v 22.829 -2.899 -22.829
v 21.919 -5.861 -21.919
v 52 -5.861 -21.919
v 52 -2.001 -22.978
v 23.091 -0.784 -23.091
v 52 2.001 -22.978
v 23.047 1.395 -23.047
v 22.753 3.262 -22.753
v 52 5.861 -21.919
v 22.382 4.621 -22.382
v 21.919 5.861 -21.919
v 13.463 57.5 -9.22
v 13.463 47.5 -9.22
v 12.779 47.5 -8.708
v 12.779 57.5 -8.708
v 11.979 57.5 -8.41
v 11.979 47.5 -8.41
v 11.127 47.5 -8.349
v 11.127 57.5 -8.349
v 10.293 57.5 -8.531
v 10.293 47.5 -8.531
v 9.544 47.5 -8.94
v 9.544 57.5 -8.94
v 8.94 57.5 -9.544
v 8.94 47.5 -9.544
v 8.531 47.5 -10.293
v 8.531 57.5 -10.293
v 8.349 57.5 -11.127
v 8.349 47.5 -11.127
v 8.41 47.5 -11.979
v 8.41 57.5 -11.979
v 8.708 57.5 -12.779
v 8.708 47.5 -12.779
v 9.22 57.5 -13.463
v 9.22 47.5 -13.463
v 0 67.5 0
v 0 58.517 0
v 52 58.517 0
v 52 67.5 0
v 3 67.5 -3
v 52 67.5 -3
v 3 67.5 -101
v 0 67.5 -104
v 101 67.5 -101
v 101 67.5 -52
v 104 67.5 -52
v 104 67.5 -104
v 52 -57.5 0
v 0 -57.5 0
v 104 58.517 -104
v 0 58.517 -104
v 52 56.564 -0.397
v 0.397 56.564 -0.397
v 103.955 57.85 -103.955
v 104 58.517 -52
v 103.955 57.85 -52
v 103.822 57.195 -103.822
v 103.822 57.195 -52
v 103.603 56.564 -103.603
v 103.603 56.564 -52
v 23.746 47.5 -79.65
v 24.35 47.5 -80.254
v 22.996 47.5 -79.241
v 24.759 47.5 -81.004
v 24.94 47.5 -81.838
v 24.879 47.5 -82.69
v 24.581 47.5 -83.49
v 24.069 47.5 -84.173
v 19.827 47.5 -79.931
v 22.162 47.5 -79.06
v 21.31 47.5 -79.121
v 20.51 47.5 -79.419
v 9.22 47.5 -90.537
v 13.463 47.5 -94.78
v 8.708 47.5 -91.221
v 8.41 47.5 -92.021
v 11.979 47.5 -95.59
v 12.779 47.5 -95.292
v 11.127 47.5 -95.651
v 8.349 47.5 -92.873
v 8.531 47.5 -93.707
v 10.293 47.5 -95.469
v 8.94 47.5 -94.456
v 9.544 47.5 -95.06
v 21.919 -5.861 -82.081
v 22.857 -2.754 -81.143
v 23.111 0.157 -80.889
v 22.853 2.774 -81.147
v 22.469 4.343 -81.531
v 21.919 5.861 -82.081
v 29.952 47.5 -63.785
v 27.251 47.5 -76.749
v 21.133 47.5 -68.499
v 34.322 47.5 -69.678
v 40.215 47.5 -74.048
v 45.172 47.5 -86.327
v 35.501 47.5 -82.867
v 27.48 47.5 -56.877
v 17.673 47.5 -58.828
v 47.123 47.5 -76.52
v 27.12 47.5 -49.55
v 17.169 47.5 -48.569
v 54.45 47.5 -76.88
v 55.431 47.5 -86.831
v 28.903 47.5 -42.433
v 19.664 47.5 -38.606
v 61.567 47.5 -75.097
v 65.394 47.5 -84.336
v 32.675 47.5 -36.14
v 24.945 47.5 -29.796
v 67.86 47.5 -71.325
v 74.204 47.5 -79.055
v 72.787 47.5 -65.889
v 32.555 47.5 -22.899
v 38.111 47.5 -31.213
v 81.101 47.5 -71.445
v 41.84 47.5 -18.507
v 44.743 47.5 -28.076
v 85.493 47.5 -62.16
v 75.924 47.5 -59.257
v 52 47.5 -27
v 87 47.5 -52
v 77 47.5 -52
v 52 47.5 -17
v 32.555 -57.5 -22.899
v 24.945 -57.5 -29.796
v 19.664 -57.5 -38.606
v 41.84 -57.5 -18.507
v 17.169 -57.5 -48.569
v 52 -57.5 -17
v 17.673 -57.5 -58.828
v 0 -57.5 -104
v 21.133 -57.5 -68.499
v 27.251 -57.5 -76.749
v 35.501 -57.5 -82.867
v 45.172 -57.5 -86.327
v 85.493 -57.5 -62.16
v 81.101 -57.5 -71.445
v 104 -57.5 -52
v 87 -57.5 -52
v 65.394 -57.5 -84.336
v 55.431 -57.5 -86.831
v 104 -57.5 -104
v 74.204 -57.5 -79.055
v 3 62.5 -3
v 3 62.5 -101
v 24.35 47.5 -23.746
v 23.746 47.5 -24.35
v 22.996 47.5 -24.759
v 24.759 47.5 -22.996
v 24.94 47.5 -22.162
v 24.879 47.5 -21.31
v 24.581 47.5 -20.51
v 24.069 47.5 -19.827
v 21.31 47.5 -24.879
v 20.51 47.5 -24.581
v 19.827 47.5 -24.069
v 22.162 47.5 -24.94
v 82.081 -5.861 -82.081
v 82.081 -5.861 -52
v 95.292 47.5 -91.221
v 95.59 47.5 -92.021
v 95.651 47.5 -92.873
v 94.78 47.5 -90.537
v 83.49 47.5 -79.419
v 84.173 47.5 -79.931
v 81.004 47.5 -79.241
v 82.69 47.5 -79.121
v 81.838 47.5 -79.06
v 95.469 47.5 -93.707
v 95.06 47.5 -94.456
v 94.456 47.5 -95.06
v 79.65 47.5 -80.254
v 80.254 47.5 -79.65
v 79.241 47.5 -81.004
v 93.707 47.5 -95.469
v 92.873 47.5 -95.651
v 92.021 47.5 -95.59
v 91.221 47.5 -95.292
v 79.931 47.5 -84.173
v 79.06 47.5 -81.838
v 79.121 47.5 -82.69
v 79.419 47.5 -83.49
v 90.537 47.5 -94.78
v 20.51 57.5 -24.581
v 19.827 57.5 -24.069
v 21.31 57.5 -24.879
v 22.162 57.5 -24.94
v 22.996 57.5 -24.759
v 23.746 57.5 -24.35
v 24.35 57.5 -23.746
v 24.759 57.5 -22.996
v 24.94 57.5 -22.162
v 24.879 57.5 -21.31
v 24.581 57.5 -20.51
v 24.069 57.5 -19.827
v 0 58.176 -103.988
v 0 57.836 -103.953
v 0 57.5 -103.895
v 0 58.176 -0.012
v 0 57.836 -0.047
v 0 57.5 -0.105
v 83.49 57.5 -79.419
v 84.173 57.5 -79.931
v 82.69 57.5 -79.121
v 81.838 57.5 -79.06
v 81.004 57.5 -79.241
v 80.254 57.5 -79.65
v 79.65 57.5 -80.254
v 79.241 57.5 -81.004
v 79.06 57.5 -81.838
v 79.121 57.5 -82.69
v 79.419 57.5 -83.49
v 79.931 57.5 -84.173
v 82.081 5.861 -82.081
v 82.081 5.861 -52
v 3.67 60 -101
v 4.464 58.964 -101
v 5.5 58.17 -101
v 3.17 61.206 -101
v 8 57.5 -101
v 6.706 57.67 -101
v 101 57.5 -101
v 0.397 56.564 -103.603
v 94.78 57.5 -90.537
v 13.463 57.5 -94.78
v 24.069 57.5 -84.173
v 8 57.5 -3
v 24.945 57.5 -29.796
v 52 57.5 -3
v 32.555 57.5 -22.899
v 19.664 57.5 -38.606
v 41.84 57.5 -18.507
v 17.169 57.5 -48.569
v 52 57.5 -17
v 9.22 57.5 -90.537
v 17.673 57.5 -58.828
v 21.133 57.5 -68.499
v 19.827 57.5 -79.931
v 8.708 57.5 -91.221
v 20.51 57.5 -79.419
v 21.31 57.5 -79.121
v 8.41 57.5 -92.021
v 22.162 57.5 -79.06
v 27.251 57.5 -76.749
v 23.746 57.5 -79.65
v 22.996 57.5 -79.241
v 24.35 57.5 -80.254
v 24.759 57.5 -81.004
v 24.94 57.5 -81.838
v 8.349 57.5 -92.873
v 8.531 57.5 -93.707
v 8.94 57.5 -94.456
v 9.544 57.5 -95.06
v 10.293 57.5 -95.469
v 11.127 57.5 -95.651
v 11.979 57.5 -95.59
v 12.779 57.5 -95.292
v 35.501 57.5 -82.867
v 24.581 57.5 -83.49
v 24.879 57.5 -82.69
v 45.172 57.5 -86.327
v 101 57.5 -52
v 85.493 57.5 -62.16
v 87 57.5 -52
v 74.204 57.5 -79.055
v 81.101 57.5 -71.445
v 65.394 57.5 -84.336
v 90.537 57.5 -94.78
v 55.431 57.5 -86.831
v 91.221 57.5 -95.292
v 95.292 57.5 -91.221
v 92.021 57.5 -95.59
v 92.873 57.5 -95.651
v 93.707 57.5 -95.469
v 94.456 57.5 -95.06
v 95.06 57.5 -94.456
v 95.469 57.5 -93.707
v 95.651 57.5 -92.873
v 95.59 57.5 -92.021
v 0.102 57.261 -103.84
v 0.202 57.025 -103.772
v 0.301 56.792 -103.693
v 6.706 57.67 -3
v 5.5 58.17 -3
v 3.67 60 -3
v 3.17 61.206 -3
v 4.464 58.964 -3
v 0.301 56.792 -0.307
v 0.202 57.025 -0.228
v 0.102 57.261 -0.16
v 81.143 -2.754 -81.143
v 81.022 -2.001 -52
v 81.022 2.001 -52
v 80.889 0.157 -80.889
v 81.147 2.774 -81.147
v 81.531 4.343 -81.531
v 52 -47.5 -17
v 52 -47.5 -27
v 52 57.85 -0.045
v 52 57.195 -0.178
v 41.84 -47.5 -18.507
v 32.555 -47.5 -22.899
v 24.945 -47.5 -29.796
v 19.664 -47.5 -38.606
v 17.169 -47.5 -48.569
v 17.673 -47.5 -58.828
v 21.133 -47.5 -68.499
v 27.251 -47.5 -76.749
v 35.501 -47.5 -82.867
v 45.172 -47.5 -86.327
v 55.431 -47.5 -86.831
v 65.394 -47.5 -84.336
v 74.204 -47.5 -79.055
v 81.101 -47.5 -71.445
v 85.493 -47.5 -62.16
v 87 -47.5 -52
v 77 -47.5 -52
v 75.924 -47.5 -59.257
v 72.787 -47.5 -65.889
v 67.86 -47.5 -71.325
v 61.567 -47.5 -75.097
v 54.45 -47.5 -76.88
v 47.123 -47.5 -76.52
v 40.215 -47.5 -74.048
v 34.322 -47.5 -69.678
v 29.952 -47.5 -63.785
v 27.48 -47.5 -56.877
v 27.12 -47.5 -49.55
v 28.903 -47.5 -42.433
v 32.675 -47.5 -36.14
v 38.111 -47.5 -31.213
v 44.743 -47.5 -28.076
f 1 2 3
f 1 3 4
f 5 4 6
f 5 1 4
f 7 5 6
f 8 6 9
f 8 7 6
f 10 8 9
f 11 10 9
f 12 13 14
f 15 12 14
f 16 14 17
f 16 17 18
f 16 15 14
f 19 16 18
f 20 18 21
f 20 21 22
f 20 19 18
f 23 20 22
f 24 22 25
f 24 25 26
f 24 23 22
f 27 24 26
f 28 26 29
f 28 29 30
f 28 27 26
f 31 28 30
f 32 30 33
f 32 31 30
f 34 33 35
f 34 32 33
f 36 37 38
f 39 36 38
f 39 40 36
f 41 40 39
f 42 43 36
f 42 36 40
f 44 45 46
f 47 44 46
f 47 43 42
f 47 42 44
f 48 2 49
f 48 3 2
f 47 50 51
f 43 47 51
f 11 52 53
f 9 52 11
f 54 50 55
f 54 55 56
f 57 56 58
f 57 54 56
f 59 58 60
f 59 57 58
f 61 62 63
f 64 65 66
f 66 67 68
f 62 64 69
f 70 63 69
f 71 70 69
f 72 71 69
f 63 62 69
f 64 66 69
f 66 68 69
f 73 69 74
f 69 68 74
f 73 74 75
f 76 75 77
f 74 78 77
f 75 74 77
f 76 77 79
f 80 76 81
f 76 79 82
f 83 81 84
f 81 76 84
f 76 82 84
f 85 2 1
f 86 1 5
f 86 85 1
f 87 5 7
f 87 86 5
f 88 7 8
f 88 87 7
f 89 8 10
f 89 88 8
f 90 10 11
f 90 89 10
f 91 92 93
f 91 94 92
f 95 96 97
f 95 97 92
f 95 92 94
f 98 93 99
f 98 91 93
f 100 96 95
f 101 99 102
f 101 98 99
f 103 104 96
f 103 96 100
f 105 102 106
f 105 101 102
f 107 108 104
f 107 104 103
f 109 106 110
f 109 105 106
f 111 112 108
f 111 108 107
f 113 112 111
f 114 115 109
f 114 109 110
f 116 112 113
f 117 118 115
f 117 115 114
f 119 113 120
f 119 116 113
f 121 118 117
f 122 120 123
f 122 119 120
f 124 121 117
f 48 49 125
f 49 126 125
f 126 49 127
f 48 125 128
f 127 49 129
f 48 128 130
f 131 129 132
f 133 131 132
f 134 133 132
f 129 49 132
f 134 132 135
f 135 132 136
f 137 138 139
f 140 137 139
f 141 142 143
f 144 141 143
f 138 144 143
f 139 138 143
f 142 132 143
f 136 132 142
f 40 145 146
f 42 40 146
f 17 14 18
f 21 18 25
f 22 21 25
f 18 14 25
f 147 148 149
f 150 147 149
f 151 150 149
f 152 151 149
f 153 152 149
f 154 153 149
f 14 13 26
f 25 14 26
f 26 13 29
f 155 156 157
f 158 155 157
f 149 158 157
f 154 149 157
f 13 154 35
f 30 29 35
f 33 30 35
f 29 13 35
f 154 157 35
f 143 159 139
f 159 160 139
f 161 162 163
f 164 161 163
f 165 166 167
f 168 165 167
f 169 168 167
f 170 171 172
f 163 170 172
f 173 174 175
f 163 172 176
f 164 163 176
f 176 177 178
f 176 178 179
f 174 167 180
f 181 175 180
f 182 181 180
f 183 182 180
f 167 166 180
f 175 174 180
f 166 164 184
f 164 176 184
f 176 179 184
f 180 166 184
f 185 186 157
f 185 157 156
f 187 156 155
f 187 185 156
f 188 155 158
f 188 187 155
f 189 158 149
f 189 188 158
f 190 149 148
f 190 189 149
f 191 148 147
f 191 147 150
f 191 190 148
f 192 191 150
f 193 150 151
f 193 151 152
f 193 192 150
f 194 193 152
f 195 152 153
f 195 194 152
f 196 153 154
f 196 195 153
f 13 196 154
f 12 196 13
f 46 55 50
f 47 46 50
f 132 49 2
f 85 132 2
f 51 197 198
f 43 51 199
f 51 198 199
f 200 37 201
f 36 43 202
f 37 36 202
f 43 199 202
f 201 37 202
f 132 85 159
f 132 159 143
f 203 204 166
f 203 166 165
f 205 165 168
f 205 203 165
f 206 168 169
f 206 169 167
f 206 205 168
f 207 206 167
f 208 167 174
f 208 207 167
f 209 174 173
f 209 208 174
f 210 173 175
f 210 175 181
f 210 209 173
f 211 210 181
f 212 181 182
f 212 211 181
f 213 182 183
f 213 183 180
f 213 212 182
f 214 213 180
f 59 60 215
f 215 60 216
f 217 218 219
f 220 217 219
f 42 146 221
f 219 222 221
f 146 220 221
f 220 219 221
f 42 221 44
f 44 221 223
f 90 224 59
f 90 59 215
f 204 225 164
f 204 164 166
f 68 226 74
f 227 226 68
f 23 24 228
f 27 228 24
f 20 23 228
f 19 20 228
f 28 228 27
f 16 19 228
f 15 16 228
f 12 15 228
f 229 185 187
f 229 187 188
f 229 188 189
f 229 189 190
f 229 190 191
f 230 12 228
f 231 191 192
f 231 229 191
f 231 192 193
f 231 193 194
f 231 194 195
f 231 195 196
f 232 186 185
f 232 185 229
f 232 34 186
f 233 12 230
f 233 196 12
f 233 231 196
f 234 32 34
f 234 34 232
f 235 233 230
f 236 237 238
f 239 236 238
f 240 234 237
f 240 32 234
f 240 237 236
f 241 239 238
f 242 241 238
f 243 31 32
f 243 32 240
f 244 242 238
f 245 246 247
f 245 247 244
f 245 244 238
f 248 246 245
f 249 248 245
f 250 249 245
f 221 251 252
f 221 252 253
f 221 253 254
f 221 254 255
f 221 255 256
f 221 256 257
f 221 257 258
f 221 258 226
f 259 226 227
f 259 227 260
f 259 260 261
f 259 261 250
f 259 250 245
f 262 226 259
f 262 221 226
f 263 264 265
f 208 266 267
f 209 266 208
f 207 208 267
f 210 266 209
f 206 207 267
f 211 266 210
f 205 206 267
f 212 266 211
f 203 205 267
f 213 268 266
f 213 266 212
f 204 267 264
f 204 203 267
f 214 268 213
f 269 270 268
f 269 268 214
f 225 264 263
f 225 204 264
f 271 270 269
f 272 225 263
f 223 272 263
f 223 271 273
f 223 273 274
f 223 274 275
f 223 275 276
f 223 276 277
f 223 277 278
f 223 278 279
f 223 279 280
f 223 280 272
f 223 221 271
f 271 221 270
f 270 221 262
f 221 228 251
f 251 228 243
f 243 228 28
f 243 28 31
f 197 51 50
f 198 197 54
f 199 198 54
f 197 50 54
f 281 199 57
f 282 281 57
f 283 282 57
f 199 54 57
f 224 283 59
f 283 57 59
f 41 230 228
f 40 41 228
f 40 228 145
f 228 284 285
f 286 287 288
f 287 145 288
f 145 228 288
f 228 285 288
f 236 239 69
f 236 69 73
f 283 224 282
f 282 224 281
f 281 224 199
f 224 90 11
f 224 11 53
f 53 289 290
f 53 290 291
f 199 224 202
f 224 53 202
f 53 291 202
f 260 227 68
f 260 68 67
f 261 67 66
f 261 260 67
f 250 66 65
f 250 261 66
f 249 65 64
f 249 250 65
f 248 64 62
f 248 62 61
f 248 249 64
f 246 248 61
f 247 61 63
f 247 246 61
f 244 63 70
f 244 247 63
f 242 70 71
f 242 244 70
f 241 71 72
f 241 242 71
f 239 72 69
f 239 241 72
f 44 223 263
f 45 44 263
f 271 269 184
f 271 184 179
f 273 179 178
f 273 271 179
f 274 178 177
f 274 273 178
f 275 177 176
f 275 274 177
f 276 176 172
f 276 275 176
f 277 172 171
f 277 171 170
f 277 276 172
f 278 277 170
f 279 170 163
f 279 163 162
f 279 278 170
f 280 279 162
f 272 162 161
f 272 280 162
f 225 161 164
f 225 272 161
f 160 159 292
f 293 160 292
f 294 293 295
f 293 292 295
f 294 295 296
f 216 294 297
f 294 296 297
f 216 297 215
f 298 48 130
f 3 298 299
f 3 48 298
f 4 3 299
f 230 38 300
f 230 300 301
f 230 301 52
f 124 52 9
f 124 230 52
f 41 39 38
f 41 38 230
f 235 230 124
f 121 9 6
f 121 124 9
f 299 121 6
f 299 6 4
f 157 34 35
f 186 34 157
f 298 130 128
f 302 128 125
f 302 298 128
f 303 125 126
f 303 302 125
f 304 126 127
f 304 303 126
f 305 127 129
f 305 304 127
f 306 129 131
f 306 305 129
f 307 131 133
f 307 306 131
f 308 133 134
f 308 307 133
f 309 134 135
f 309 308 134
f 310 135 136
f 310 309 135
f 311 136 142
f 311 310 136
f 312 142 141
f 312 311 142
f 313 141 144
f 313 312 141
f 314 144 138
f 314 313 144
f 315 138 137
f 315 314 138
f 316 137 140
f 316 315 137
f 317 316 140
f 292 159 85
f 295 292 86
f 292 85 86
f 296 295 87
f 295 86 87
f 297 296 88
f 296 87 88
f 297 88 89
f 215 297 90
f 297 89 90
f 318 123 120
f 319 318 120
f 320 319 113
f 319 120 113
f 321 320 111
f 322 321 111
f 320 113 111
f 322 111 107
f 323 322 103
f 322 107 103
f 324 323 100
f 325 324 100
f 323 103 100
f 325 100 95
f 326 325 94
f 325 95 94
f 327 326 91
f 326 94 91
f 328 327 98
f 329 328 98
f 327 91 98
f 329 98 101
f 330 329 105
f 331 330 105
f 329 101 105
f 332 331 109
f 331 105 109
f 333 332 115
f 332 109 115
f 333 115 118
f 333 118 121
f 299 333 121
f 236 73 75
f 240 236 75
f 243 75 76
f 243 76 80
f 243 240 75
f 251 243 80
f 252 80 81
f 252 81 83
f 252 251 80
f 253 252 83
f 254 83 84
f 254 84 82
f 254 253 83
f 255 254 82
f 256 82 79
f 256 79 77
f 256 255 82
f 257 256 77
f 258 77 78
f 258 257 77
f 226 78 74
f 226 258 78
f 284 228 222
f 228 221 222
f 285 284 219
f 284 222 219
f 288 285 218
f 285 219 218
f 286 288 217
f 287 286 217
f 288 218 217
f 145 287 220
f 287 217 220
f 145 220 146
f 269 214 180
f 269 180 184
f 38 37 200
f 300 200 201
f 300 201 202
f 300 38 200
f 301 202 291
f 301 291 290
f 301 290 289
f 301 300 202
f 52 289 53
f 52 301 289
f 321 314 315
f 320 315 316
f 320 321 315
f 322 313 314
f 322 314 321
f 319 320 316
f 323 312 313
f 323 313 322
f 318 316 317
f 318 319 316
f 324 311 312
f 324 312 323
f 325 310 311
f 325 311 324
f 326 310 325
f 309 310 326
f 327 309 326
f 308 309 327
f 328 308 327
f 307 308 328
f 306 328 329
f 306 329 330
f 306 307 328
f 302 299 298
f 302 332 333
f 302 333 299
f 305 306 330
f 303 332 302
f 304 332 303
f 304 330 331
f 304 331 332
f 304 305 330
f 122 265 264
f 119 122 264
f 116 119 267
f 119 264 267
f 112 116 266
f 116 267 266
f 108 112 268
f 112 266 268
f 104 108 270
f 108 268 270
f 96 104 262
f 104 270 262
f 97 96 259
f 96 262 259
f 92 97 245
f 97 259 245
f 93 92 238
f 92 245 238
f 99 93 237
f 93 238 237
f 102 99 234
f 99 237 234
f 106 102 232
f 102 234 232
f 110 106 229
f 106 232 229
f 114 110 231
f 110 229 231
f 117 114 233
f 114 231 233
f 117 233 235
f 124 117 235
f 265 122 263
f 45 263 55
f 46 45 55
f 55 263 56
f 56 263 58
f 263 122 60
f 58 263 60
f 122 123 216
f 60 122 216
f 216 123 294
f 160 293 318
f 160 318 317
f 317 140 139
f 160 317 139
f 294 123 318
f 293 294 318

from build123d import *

# Parameters (mm, degrees)
SKETCH1_W           = 104
SKETCH1_H           = 104
BOSS_EXTRUDE1_DEPTH = 57.5
CUT_EXTRUDE1_DEPTH  = 104
CUT_EXTRUDE2_DEPTH  = 104
SKETCH4_R           = 25
CUT_EXTRUDE3_DEPTH  = 115
SKETCH5_R           = 35
SKETCH5_R_2         = 25
CUT_EXTRUDE4_DEPTH  = 10
CUT_EXTRUDE5_START  = -10
SKETCH6_R           = 35
CUT_EXTRUDE5_DEPTH  = 10
SKETCH7_W           = 52
SKETCH7_H           = 52
CUT_EXTRUDE6_DEPTH  = 115
FILLET1_R           = 15
BOSS_EXTRUDE2_DEPTH = 10
CUT_EXTRUDE7_DEPTH  = 10
FILLET2_R           = 5


with BuildPart() as part:
    # Sketch1 → Boss-Extrude1 (new, symmetric)
    with BuildSketch(Plane(origin=(0, 0, 0), x_dir=(1, 0, 0), z_dir=(0, 1, 0))):
        with Locations((52, 52)):
            Rectangle(SKETCH1_W, SKETCH1_H)
    extrude(amount=BOSS_EXTRUDE1_DEPTH, both=True)

    # Sketch2 → Cut-Extrude1 (cut)
    with BuildSketch(Plane.XY):
        Polygon((0, -57.5), (24.407301932, 0), (0, 57.5), align=None)
        Polygon((104, 57.5), (79.592698068, 0), (104, -57.5), align=None)
    extrude(amount=-CUT_EXTRUDE1_DEPTH, mode=Mode.SUBTRACT)

    # Sketch3 → Cut-Extrude2 (cut)
    with BuildSketch(Plane.ZY.offset(-104)):
        Polygon((-104, 57.5), (-79.592698068, 0), (-104, -57.5), align=None)
        Polygon((0, 57.5), (-24.407301932, 0), (0, -57.5), align=None)
    extrude(amount=CUT_EXTRUDE2_DEPTH, mode=Mode.SUBTRACT)

    # Sketch4 → Cut-Extrude3 (cut)
    with BuildSketch(Plane(origin=(0, 57.5, 0), x_dir=(1, 0, 0), z_dir=(0, 1, 0))):
        with Locations(Location((52, 52, 0), (0, 0, 270))):
            Circle(SKETCH4_R)
    extrude(amount=-CUT_EXTRUDE3_DEPTH, mode=Mode.SUBTRACT)

    # Sketch5 → Cut-Extrude4 (cut)
    with BuildSketch(Plane(origin=(0, 57.5, 0), x_dir=(1, 0, 0), z_dir=(0, 1, 0))):
        with Locations(Location((52, 52, 0), (0, 0, 270))):
            Circle(SKETCH5_R)
        with Locations(Location((52, 52, 0), (0, 0, 270))):
            Circle(SKETCH5_R_2, mode=Mode.SUBTRACT)
    extrude(amount=-CUT_EXTRUDE4_DEPTH, mode=Mode.SUBTRACT)

    # Sketch6 → Cut-Extrude5 (cut)
    with BuildSketch(Plane.XZ.offset(57.5).offset(CUT_EXTRUDE5_START)):
        with Locations(Location((52, -52, 0), (0, 0, 90))):
            Circle(SKETCH6_R)
    extrude(amount=CUT_EXTRUDE5_DEPTH, mode=Mode.SUBTRACT)

    # Sketch7 → Cut-Extrude6 (cut)
    with BuildSketch(Plane(origin=(0, 57.5, 0), x_dir=(1, 0, 0), z_dir=(0, 1, 0))):
        with Locations((78, 26)):
            Rectangle(SKETCH7_W, SKETCH7_H)
    extrude(amount=-CUT_EXTRUDE6_DEPTH, mode=Mode.SUBTRACT)

    # Fillet1
    fillet1_edges = [part.edges().sort_by_distance(p)[0] for p in [
        (24.407301932, 0, -52),
        (79.592698068, 0, -65.796349034),
        (52, 0, -79.592698068),
        (38.203650966, 0, -24.407301932),
    ]]
    fillet(fillet1_edges, radius=FILLET1_R)

    # Sketch8 → Boss-Extrude2 (add)
    with BuildSketch(Plane(origin=(0, 57.5, 0), x_dir=(1, 0, 0), z_dir=(0, 1, 0))):
        Polygon((101, 101), (101, 52), (104, 52), (104, 104), (0, 104), (0, 0), (52, 0), (52, 3), (3, 3), (3, 101), align=None)
    extrude(amount=BOSS_EXTRUDE2_DEPTH)

    # Sketch9 → Cut-Extrude7 (cut)
    with BuildSketch(Plane(origin=(0, 57.5, 0), x_dir=(1, 0, 0), z_dir=(0, 1, 0))):
        with BuildLine():
            Line((13.462680425, 94.779960262), (24.069282143, 84.173358544))
            ThreePointArc((24.069282143, 84.173358544), (24.069282143, 79.930717857), (19.826641456, 79.930717857))
            Line((19.826641456, 79.930717857), (9.220039738, 90.537319575))
            ThreePointArc((9.220039738, 90.537319575), (9.220039738, 94.779960262), (13.462680425, 94.779960262))
        make_face()
        with BuildLine():
            Line((94.779960262, 90.537319575), (84.173358544, 79.930717857))
            ThreePointArc((84.173358544, 79.930717857), (79.930717857, 79.930717857), (79.930717857, 84.173358544))
            Line((79.930717857, 84.173358544), (90.537319575, 94.779960262))
            ThreePointArc((90.537319575, 94.779960262), (94.779960262, 94.779960262), (94.779960262, 90.537319575))
        make_face()
        with BuildLine():
            Line((24.069282143, 19.826641456), (13.462680425, 9.220039738))
            ThreePointArc((13.462680425, 9.220039738), (9.220039738, 9.220039738), (9.220039738, 13.462680425))
            Line((9.220039738, 13.462680425), (19.826641456, 24.069282143))
            ThreePointArc((19.826641456, 24.069282143), (24.069282143, 24.069282143), (24.069282143, 19.826641456))
        make_face()
    extrude(amount=-CUT_EXTRUDE7_DEPTH, mode=Mode.SUBTRACT)

    # Fillet2
    fillet2_edges = [part.edges().sort_by_distance(p)[0] for p in [
        (104, 57.5, -78),
        (3, 57.5, -52),
        (52, 57.5, -104),
        (26, 57.5, 0),
    ]]
    fillet(fillet2_edges, radius=FILLET2_R)


solid = part.part
